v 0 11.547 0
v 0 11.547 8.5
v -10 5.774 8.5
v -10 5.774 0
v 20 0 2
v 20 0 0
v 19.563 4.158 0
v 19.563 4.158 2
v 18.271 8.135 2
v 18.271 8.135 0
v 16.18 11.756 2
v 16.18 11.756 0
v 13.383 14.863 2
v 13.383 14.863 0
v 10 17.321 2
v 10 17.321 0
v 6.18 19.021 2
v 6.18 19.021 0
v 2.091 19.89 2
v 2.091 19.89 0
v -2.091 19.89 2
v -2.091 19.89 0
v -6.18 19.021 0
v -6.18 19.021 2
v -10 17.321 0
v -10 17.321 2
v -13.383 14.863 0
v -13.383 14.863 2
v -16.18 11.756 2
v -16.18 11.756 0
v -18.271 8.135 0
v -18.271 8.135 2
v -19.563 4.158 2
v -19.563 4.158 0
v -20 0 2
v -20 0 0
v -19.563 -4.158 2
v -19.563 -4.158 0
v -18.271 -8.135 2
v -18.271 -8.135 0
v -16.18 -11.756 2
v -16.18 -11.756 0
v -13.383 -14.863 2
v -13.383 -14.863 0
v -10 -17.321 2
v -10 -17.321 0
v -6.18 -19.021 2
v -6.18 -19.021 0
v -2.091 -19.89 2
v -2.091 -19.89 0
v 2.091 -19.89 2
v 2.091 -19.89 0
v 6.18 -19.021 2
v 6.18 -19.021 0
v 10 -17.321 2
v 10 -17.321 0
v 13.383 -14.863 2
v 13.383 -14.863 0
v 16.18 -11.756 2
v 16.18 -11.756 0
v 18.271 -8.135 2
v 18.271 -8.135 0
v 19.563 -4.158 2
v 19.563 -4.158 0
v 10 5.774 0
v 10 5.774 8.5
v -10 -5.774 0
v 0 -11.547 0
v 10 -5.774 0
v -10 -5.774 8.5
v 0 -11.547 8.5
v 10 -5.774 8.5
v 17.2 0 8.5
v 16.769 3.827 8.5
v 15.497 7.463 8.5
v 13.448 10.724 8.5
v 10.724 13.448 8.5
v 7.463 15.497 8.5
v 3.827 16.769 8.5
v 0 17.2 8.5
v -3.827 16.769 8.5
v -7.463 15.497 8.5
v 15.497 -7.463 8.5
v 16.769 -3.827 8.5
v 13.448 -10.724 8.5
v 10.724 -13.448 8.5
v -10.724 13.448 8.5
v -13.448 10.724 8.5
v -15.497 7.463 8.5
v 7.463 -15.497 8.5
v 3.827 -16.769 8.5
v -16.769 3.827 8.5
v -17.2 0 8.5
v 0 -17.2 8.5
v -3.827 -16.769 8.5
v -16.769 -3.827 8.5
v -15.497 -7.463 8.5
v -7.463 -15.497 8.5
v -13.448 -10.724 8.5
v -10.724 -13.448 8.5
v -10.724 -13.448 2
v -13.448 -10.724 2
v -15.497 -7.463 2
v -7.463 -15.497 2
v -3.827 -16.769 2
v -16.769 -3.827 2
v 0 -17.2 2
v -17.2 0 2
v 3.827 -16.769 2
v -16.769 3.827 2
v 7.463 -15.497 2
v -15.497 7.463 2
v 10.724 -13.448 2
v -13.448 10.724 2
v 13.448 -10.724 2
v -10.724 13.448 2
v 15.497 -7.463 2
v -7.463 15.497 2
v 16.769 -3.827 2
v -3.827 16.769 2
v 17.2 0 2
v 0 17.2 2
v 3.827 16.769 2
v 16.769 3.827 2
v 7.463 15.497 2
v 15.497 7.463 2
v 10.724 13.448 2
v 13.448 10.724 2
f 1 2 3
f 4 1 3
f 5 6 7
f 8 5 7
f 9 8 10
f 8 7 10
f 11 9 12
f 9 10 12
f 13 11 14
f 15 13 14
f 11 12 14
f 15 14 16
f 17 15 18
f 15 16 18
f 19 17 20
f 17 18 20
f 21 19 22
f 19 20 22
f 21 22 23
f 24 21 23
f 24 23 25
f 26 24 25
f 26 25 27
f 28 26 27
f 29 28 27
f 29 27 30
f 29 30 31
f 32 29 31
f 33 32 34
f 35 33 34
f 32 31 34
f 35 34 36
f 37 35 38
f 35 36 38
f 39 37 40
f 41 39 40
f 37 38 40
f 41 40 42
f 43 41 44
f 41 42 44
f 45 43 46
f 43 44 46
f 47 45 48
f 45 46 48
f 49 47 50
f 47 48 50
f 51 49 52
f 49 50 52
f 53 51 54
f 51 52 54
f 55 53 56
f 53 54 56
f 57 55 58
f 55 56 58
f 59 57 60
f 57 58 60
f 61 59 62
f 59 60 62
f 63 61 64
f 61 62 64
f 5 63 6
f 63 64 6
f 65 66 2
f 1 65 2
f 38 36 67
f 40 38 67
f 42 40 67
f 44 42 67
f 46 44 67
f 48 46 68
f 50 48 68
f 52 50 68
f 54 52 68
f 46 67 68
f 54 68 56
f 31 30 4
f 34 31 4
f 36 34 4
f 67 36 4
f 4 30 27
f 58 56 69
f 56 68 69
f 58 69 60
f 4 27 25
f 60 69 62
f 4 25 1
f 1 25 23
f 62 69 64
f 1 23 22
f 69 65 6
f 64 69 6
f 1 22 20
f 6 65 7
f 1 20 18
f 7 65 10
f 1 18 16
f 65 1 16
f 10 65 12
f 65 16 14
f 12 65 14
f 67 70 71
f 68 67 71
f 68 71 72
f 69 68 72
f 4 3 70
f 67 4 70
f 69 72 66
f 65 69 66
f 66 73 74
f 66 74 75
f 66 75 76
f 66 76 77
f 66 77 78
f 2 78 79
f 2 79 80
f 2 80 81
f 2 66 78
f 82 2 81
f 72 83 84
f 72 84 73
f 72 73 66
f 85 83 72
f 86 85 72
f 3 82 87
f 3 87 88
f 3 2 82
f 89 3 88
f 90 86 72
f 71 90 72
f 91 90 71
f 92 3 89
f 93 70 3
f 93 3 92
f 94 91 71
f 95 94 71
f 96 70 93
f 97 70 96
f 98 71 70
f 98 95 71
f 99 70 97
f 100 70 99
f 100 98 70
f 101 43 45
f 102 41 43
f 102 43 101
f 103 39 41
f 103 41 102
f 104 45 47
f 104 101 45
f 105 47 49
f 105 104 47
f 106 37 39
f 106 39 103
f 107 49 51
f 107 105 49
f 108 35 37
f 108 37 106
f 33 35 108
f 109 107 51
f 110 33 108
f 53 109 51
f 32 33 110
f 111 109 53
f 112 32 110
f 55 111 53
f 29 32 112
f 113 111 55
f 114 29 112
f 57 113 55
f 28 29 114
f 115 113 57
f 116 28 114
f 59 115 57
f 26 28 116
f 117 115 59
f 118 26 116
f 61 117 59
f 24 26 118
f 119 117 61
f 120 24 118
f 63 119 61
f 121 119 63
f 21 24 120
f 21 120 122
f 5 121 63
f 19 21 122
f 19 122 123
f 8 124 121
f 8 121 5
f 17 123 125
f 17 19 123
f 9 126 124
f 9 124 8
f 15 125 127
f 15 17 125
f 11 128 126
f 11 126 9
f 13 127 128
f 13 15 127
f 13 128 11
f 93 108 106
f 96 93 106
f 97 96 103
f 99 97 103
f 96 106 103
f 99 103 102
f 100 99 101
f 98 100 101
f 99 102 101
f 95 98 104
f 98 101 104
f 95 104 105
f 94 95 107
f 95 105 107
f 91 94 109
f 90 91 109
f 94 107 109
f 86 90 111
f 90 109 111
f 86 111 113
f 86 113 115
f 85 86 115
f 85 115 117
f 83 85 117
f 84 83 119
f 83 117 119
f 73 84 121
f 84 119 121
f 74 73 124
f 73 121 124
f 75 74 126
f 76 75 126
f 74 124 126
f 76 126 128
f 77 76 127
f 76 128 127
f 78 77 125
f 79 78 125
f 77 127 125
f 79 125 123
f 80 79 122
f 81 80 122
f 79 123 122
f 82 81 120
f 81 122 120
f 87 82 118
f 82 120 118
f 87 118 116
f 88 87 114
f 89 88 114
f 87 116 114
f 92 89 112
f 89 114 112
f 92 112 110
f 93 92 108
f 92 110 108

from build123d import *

# Parameters (mm, degrees)
SKETCH1_R           = 20
BOSS_EXTRUDE1_DEPTH = 2
SKETCH2_R           = 17.2
BOSS_EXTRUDE2_DEPTH = 6.5
CUT_EXTRUDE1_DEPTH  = 30.533878851


with BuildPart() as part:
    # Sketch1 → Boss-Extrude1 (new body)
    with BuildSketch(Plane.XY):
        Circle(SKETCH1_R)
    extrude(amount=BOSS_EXTRUDE1_DEPTH)

    # Sketch2 → Boss-Extrude2 (add)
    with BuildSketch(Plane.XY.offset(2)):
        with Locations(Location((0, 0, 0), (0, 0, 180))):
            Circle(SKETCH2_R)
    extrude(amount=BOSS_EXTRUDE2_DEPTH)

    # Sketch3 → Cut-Extrude1 (cut, through all)
    with BuildSketch(Plane.XY.offset(8.5)):
        Polygon((0, 11.547005384), (-10, 5.773502692), (-10, -5.773502692), (0, -11.547005384), (10, -5.773502692), (10, 5.773502692), align=None)
    extrude(amount=-CUT_EXTRUDE1_DEPTH, mode=Mode.SUBTRACT)


solid = part.part
